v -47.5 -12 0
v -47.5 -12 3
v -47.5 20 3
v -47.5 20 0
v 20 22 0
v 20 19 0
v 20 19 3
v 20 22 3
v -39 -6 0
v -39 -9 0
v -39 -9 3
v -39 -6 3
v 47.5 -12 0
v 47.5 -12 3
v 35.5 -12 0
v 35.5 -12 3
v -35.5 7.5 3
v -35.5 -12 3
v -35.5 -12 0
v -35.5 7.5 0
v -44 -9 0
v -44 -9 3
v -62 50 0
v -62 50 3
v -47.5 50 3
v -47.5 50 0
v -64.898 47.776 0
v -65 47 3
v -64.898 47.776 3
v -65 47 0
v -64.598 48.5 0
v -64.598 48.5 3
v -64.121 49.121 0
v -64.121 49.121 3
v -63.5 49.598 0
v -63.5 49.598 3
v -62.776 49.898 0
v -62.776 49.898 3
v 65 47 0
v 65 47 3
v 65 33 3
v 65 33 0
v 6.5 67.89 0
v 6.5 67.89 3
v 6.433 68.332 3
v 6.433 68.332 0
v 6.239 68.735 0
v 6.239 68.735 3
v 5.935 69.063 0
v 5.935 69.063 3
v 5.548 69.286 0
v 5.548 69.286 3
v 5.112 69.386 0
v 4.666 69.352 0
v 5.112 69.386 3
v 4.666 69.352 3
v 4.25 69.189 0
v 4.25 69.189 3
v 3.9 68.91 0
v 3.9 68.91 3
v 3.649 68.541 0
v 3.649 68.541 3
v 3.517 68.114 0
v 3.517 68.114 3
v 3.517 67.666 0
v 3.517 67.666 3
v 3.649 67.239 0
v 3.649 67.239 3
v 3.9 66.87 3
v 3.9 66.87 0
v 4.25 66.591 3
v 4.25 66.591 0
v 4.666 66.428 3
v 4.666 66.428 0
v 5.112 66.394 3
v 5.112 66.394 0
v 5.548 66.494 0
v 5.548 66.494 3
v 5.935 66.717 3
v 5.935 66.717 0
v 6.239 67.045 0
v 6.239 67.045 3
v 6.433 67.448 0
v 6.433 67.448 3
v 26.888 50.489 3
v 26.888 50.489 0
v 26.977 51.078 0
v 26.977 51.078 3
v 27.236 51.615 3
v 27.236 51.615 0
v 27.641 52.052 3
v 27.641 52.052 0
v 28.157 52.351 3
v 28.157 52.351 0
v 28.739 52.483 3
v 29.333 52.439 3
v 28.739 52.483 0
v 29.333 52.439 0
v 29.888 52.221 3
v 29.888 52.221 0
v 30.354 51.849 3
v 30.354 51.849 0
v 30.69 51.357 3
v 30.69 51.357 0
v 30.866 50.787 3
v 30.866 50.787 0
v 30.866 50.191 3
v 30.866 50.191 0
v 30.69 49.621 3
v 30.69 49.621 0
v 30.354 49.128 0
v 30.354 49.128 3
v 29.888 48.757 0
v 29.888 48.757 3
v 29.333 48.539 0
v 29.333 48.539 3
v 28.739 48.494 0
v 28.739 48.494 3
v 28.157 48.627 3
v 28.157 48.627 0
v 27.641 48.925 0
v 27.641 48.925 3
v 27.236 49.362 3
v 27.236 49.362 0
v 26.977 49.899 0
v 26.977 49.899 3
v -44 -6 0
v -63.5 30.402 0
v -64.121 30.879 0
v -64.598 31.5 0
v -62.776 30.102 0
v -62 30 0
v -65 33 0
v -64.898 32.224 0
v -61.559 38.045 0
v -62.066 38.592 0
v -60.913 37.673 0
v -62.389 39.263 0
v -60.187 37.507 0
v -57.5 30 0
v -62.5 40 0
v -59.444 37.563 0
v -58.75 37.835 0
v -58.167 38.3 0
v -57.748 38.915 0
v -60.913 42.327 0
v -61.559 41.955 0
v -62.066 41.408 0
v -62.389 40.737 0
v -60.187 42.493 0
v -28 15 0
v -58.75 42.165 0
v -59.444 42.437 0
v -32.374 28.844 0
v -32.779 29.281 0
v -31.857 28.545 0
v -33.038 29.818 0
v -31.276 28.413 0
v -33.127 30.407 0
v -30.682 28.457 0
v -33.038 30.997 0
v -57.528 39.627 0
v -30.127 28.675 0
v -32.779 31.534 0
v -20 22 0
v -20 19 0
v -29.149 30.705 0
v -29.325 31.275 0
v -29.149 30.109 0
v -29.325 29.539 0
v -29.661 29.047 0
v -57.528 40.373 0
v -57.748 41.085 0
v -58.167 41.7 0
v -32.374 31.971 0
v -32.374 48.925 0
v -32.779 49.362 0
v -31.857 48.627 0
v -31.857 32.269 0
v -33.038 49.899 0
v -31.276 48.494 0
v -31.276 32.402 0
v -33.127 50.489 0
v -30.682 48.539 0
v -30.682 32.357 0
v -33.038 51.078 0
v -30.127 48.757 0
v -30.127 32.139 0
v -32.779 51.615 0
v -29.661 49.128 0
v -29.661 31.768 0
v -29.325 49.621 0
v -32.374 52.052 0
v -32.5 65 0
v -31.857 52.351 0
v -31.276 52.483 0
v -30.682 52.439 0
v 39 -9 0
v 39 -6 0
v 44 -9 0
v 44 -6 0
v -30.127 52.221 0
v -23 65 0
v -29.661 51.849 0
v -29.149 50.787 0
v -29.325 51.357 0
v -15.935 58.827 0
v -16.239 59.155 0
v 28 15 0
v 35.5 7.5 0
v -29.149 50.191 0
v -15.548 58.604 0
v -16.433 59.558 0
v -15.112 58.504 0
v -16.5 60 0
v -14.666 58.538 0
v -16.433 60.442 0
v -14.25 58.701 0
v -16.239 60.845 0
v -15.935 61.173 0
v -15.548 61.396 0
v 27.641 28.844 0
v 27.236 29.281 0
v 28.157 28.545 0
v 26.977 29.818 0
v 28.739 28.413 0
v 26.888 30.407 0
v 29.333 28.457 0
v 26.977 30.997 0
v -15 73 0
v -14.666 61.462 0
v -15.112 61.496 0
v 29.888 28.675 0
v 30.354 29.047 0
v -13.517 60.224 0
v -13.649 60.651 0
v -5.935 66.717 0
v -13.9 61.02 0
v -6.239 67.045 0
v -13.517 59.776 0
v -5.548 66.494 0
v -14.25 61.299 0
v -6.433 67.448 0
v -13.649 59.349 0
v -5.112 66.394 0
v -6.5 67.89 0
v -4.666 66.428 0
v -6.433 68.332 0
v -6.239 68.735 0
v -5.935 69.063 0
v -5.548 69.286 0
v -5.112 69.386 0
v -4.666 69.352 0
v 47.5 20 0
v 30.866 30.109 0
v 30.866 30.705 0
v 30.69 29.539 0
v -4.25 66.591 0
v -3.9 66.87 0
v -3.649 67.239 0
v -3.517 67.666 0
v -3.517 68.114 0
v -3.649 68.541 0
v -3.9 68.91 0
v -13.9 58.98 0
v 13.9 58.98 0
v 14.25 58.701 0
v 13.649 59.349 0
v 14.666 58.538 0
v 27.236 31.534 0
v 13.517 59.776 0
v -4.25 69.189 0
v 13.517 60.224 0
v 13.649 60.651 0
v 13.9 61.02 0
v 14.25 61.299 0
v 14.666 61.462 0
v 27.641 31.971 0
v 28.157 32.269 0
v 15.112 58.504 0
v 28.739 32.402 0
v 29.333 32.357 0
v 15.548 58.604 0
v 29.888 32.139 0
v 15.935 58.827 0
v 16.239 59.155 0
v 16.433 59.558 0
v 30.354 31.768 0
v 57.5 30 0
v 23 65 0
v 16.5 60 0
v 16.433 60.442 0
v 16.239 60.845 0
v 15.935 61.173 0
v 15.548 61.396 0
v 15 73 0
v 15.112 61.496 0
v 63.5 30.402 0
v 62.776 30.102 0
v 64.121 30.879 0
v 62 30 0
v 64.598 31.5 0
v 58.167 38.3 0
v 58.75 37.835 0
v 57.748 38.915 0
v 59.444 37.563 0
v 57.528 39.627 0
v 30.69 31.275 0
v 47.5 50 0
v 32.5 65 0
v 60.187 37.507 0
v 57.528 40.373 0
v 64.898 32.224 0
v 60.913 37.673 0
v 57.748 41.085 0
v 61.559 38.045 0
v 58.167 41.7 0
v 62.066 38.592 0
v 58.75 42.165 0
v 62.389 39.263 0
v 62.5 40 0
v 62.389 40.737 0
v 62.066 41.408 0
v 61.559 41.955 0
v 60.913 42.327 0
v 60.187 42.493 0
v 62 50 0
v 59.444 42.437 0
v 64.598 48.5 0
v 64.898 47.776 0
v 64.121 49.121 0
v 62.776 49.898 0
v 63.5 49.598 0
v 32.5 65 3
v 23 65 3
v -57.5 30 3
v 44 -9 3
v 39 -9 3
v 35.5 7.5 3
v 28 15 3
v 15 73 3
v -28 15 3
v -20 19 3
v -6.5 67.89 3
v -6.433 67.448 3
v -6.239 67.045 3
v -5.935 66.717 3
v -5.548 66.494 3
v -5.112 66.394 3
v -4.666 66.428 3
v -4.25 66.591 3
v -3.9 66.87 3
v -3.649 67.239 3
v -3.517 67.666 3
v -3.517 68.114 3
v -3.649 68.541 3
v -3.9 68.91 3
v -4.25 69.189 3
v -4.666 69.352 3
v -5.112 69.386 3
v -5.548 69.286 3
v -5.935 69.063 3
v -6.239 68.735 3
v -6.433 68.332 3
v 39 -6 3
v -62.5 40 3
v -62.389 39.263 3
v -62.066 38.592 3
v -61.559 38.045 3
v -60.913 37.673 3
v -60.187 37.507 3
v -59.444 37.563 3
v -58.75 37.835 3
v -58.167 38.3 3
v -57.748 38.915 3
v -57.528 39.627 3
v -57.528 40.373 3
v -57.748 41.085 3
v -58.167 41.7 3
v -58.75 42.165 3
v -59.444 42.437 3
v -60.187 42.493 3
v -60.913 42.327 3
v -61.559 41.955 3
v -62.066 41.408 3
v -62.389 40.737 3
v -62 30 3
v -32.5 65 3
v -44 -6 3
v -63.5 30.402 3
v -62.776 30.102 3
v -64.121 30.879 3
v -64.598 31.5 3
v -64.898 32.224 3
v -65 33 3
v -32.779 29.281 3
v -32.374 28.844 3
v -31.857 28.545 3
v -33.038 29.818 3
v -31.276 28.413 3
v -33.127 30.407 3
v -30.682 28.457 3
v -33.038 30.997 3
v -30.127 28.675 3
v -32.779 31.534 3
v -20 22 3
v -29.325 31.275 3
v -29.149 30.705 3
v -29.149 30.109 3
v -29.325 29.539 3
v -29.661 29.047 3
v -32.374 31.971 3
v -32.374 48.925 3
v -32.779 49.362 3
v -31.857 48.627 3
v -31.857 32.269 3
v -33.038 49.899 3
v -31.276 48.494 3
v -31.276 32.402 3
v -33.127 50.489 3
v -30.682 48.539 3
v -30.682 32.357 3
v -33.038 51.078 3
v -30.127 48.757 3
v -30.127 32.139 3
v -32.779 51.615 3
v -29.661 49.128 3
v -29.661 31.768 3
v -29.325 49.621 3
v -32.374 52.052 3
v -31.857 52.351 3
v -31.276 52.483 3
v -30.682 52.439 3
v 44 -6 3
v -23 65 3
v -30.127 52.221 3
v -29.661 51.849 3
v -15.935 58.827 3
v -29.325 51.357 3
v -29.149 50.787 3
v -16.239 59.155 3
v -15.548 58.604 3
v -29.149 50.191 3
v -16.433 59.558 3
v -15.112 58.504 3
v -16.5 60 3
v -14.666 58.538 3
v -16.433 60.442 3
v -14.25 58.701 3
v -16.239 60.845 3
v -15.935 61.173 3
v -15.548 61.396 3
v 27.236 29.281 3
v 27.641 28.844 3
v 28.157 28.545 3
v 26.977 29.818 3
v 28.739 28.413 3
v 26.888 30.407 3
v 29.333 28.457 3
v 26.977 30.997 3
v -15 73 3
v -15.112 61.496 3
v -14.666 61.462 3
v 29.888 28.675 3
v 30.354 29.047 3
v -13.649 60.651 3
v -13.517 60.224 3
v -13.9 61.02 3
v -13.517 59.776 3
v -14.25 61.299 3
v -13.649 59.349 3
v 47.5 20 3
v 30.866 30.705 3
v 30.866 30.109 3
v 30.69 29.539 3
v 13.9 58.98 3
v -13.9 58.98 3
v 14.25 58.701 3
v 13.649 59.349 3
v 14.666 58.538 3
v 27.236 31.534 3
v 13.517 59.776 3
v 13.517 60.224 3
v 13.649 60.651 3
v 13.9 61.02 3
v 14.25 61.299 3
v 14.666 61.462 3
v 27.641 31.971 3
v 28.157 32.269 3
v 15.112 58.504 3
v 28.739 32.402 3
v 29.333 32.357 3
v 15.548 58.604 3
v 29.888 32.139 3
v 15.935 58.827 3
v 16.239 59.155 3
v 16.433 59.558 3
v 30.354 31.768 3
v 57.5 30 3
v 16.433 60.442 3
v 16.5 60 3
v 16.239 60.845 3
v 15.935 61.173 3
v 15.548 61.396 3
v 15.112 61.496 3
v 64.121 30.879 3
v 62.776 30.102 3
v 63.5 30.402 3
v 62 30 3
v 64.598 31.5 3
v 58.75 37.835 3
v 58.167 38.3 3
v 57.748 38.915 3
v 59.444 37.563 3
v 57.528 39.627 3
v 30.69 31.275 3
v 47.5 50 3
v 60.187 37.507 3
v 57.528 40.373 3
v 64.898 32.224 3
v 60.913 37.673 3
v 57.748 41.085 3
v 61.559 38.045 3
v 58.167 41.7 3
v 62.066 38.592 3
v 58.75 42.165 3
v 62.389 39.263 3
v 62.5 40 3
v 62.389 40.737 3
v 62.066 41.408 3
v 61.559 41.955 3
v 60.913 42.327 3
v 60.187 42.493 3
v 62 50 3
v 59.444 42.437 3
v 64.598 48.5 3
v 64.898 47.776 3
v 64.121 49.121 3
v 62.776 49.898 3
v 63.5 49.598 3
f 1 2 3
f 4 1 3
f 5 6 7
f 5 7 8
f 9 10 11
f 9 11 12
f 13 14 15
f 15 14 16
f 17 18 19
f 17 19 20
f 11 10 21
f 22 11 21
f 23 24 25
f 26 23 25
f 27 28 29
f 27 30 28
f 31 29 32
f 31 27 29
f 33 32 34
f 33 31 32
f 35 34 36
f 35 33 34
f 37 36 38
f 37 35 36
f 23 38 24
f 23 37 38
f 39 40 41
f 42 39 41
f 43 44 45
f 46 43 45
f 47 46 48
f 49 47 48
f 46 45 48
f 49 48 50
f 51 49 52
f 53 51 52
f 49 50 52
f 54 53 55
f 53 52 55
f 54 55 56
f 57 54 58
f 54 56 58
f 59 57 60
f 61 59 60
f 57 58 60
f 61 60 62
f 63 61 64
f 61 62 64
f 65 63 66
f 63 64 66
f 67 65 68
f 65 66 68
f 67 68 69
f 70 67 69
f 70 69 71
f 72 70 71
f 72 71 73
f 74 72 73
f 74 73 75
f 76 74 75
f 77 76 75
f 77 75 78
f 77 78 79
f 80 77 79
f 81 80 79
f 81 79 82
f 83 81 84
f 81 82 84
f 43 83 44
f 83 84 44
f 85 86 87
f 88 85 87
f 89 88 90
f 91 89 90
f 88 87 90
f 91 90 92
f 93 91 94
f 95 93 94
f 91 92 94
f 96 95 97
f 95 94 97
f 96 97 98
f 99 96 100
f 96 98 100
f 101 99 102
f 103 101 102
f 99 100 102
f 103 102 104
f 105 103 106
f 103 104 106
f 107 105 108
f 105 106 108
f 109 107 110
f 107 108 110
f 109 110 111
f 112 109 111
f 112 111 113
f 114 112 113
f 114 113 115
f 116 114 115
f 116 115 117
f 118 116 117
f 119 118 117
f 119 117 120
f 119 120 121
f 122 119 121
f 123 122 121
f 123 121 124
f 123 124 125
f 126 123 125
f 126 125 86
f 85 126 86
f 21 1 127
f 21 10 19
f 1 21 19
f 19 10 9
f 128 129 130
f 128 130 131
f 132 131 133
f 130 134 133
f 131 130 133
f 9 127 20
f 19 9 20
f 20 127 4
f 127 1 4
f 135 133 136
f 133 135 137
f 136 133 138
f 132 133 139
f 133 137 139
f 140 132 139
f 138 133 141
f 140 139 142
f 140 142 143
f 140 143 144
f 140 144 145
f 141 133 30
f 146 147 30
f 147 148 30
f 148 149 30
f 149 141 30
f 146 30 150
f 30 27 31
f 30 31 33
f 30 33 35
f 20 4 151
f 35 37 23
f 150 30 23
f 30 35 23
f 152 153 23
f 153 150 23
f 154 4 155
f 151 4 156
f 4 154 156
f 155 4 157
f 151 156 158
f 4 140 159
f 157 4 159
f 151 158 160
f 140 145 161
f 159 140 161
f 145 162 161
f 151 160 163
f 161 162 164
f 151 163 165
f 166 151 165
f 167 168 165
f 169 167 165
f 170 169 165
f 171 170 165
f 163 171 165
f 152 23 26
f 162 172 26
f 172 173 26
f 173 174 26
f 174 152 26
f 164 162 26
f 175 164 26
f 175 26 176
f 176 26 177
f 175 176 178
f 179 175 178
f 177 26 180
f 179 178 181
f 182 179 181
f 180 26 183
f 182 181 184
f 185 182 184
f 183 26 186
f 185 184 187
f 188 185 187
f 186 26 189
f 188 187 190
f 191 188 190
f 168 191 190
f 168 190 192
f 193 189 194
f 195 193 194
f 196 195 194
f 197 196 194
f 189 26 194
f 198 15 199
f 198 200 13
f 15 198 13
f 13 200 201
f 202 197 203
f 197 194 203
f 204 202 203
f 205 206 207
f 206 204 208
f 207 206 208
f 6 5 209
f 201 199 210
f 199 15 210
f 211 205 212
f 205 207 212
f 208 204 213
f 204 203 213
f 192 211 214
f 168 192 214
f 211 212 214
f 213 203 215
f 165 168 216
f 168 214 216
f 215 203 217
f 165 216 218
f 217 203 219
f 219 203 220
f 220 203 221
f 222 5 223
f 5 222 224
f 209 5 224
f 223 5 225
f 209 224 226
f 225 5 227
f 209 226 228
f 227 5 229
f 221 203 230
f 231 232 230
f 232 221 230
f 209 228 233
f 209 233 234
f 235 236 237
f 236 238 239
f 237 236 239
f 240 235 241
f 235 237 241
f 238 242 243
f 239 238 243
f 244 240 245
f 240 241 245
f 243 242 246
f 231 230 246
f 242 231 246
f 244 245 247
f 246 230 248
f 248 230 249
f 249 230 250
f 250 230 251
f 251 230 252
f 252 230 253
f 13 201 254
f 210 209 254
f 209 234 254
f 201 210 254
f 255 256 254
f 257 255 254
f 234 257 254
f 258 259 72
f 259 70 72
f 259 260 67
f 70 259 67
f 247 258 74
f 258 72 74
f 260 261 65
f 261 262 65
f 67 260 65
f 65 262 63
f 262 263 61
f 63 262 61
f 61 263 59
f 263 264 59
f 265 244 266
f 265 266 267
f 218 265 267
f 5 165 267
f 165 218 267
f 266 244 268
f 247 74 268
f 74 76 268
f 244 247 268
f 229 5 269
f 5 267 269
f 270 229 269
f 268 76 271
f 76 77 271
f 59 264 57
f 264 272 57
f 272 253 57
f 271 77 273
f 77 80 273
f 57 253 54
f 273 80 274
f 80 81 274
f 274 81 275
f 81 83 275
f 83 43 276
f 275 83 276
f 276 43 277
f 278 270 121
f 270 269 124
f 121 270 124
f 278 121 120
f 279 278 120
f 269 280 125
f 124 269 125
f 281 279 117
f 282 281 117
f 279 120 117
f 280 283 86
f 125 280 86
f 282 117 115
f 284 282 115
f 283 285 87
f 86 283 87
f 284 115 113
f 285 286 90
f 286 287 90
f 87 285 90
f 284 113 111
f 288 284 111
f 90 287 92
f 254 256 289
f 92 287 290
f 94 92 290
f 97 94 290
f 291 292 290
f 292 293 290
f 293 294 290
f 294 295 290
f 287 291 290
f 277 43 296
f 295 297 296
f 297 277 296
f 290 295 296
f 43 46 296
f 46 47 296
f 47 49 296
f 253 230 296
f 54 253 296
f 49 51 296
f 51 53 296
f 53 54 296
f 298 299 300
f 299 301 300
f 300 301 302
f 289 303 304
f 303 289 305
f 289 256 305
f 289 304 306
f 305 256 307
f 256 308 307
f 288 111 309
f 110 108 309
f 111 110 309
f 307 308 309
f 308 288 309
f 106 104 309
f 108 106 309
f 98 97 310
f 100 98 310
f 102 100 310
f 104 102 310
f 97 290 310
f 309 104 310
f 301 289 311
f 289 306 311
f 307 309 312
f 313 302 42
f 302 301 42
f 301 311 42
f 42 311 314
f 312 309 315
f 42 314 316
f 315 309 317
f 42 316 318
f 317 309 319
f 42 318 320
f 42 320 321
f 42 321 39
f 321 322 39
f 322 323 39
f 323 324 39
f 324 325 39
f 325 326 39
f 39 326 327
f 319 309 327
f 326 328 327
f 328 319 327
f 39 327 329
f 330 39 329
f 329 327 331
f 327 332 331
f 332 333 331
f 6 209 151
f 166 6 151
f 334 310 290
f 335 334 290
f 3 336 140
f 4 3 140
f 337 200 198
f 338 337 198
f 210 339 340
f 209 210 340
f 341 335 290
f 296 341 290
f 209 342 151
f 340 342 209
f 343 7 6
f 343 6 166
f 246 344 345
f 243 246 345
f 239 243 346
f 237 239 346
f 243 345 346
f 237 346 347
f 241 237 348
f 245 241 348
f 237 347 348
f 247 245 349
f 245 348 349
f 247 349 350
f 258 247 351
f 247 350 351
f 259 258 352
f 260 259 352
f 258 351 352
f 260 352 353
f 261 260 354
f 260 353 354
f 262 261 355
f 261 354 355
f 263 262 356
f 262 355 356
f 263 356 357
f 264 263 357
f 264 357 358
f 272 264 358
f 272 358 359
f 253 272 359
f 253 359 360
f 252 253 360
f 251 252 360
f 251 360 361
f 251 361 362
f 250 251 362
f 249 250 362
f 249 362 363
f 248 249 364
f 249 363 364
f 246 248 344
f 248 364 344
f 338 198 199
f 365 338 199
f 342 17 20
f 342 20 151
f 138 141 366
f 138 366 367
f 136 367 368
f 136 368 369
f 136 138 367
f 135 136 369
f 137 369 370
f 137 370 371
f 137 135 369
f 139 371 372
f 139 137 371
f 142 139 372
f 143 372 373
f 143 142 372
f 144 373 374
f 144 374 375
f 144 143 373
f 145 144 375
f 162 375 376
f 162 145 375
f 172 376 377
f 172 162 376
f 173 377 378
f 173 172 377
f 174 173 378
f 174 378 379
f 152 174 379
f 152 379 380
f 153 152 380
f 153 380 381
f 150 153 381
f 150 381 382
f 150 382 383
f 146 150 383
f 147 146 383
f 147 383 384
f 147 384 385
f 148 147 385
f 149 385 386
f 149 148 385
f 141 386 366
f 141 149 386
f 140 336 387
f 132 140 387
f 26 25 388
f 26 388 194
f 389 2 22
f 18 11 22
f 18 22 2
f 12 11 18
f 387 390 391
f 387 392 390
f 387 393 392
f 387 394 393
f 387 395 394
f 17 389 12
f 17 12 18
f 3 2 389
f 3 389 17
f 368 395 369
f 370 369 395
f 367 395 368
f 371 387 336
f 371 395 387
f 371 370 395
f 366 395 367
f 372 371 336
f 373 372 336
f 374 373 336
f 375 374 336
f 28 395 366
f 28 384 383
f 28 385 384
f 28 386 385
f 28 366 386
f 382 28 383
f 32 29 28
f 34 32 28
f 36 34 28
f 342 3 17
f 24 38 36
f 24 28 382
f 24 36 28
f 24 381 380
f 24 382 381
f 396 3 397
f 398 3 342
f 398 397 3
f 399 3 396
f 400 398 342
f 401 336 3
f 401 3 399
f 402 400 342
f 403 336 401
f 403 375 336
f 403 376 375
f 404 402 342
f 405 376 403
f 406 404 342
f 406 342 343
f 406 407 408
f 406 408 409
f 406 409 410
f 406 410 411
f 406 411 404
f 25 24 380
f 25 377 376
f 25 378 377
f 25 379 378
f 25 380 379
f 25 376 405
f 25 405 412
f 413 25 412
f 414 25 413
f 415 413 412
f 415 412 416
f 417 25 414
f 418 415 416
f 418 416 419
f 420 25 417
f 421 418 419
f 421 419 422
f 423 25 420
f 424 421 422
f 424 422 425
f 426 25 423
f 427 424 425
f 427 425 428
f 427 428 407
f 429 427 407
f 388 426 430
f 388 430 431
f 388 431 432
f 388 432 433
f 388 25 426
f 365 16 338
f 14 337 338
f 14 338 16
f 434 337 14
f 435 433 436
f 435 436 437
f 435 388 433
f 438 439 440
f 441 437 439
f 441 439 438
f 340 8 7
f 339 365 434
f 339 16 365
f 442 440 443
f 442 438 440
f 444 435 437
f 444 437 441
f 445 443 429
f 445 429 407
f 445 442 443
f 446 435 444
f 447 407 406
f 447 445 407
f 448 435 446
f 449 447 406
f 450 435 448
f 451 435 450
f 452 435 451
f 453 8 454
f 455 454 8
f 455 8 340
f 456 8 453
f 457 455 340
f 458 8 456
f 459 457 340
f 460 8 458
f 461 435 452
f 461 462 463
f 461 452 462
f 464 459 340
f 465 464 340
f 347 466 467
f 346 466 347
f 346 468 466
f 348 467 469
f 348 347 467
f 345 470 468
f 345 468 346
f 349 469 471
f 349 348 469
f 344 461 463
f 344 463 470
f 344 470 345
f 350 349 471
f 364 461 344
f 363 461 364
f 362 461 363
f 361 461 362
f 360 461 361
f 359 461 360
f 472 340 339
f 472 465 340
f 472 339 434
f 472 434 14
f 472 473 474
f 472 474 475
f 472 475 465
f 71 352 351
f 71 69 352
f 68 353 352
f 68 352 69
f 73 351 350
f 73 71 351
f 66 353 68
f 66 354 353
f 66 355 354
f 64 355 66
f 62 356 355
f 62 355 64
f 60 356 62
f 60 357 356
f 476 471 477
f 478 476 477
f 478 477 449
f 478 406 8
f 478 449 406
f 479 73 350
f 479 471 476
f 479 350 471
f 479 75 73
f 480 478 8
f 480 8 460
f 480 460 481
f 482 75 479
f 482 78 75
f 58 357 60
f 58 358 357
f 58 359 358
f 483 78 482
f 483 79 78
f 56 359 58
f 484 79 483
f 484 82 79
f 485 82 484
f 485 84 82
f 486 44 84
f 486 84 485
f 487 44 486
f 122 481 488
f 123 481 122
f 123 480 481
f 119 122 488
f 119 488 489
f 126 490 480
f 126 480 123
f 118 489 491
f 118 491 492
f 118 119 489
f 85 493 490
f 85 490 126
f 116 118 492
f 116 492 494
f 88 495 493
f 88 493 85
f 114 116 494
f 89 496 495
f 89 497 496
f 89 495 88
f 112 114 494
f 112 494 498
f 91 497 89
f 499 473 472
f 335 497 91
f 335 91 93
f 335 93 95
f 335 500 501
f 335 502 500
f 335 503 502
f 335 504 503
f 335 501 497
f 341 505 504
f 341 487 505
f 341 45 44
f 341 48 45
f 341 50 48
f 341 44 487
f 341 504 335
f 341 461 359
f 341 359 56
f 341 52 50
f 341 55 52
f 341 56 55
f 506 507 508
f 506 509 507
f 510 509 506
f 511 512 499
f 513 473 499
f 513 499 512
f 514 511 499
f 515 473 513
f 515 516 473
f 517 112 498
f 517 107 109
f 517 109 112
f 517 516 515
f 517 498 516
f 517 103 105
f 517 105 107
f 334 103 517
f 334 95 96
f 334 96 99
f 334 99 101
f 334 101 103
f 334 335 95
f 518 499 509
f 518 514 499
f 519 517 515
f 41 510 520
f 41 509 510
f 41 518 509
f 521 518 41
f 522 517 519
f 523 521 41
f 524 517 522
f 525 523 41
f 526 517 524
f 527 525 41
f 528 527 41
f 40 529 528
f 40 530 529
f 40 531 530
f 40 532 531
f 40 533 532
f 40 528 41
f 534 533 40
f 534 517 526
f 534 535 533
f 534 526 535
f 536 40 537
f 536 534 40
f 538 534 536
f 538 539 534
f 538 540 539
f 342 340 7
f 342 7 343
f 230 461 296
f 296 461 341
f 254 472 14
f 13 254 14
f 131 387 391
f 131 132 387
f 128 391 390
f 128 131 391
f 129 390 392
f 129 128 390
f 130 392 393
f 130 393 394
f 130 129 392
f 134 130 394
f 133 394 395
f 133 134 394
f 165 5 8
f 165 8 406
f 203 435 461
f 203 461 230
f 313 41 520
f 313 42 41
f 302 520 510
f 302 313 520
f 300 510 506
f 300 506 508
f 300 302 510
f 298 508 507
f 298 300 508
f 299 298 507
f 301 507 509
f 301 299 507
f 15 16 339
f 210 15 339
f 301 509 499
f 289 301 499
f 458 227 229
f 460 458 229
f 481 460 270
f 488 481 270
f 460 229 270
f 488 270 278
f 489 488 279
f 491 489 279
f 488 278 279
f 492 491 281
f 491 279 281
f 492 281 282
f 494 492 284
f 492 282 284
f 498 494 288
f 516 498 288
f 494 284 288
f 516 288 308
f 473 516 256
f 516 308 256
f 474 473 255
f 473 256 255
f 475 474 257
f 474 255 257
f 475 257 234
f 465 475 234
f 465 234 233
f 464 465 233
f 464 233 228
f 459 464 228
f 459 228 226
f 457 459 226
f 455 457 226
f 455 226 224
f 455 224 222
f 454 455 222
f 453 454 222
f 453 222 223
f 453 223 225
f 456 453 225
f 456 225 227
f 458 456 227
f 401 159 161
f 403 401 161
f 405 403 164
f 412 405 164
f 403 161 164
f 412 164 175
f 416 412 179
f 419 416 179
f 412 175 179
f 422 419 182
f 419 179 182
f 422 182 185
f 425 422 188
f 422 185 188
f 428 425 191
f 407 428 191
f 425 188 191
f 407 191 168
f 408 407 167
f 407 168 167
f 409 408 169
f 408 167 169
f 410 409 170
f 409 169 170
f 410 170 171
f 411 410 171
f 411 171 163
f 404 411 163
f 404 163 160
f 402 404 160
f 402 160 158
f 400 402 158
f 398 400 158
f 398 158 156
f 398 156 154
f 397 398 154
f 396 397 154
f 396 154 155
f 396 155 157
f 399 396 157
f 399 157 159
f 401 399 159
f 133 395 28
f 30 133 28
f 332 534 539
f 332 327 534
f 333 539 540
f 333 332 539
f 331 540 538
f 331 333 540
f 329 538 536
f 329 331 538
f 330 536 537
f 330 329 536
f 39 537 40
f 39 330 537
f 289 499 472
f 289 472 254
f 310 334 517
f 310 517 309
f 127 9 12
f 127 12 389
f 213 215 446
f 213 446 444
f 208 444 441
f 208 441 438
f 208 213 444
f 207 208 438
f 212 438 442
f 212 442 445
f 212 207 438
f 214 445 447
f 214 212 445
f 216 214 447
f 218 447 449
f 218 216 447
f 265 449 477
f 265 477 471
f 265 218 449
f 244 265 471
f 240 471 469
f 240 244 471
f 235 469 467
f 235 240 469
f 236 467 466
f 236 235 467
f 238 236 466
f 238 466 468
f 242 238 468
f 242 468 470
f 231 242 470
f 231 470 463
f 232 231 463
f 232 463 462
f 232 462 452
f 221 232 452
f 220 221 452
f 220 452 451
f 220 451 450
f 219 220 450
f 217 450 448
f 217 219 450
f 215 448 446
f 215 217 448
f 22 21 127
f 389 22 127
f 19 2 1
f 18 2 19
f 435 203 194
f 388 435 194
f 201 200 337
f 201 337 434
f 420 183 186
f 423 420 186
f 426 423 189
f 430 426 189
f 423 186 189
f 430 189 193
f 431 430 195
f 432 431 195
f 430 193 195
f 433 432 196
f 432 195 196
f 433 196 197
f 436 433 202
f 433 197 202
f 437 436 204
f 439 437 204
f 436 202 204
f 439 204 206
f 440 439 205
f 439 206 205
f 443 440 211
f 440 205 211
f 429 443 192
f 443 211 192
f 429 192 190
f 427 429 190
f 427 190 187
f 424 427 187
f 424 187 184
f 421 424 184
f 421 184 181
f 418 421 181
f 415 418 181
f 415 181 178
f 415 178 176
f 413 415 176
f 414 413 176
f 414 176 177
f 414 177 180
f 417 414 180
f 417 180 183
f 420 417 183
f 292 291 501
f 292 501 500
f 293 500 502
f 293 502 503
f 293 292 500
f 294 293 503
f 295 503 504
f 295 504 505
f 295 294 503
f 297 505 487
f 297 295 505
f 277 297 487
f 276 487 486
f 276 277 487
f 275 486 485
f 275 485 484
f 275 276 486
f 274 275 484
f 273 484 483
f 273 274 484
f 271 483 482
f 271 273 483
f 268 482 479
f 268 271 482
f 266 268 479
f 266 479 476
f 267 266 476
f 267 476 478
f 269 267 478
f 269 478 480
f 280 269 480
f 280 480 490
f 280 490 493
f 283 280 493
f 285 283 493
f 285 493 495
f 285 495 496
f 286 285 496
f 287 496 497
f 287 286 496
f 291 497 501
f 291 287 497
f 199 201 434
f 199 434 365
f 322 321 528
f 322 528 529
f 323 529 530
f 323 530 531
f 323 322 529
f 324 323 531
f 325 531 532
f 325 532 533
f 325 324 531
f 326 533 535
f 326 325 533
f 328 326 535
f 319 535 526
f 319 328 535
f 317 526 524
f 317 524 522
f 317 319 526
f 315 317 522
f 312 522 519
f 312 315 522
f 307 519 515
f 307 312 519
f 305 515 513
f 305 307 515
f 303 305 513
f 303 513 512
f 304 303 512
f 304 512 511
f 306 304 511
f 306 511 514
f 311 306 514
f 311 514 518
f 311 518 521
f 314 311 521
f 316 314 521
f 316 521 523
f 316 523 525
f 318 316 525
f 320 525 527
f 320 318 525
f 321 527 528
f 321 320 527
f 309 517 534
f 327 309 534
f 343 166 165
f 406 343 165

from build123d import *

# Parameters (mm, degrees)
SKETCH1_R           = 1.5
SKETCH1_R_2         = 2.5
BOSS_EXTRUDE1_DEPTH = 3
CUT_EXTRUDE1_DEPTH  = 3
FILLET1_R           = 3
CHAMFER4_SIZE       = 15
CHAMFER5_SIZE       = 10
SKETCH13_W          = 30
SKETCH13_H          = 8
BOSS_EXTRUDE5_DEPTH = 3
SKETCH8_W           = 95
SKETCH8_H           = 65.304735008
CUT_EXTRUDE5_DEPTH  = 10
SKETCH11_W          = 95
SKETCH11_H          = 7
BOSS_EXTRUDE3_DEPTH = 3
SKETCH10_R          = 1.5
CUT_EXTRUDE6_DEPTH  = 3
BOSS_EXTRUDE4_DEPTH = 3
CHAMFER6_SIZE       = 8
SKETCH17_R          = 2
CUT_EXTRUDE9_DEPTH  = 10
SKETCH15_W          = 40
SKETCH15_H          = 3
CUT_EXTRUDE8_DEPTH  = 10
BOSS_EXTRUDE6_START = -3
BOSS_EXTRUDE6_DEPTH = 3
SKETCH18_W          = 5
SKETCH18_H          = 3
CUT_EXTRUDE11_DEPTH = 10


with BuildPart() as part:
    # Sketch1 → Boss-Extrude1 (new body)
    with BuildSketch(Plane.XY):
        with BuildLine():
            Line((40.5, -40), (44.5, -40))
            Line((44.5, -40), (47.5, -37))
            Line((47.5, -37), (47.5, 10))
            Line((47.5, 10), (47.5, 15))
            Line((47.5, 15), (52.5, 15))
            Line((52.5, 15), (70, 15))
            ThreePointArc((70, 15), (73.535533906, 16.464466094), (75, 20))
            Line((75, 20), (75, 60))
            ThreePointArc((75, 60), (73.535533906, 63.535533906), (70, 65))
            Line((70, 65), (-70, 65))
            ThreePointArc((-70, 65), (-73.535533906, 63.535533906), (-75, 60))
            Line((-75, 60), (-75, 20))
            ThreePointArc((-75, 20), (-73.535533906, 16.464466094), (-70, 15))
            Line((-70, 15), (-52.5, 15))
            Line((-52.5, 15), (-47.5, 15))
            Line((-47.5, 15), (-47.5, 10))
            Line((-47.5, 10), (-47.5, -37))
            Line((-47.5, -37), (-44.5, -40))
            Line((-44.5, -40), (-40.5, -40))
            Line((-40.5, -40), (-37.5, -37))
            Line((-37.5, -37), (-37.5, 10))
            ThreePointArc((-37.5, 10), (-36.035533906, 13.535533906), (-32.5, 15))
            Line((-32.5, 15), (32.5, 15))
            ThreePointArc((32.5, 15), (36.035533906, 13.535533906), (37.5, 10))
            Line((37.5, 10), (37.5, -37))
            Line((37.5, -37), (40.5, -40))
        make_face()
        with Locations((-42.5, -20)):
            Circle(SKETCH1_R, mode=Mode.SUBTRACT)
        with Locations((-42.5, -35)):
            Circle(SKETCH1_R, mode=Mode.SUBTRACT)
        with Locations((42.5, -20)):
            Circle(SKETCH1_R, mode=Mode.SUBTRACT)
        with Locations((42.5, -35)):
            Circle(SKETCH1_R, mode=Mode.SUBTRACT)
        with Locations((60, 40)):
            Circle(SKETCH1_R_2, mode=Mode.SUBTRACT)
        with Locations((15, 60)):
            Circle(SKETCH1_R, mode=Mode.SUBTRACT)
        with Locations(Location((-15, 60, 0), (0, 0, 180))):
            Circle(SKETCH1_R, mode=Mode.SUBTRACT)
        with Locations(Location((-60, 40, 0), (0, 0, 180))):
            Circle(SKETCH1_R_2, mode=Mode.SUBTRACT)
    extrude(amount=BOSS_EXTRUDE1_DEPTH)

    # Sketch3 → Cut-Extrude1 (cut)
    with BuildSketch(Plane.XY.offset(3)):
        Polygon((65, 50), (65, 30), (47.5, 30), (47.5, 15), (75, 15), (75, 23.034767996), (75, 32.364095159), (75, 65), (47.5, 65), (47.5, 50), align=None)
        Polygon((-47.5, 65), (-75, 65), (-75, 32.364095159), (-75, 23.034767996), (-75, 15), (-47.5, 15), (-47.5, 30), (-65, 30), (-65, 50), (-47.5, 50), align=None)
    extrude(amount=-CUT_EXTRUDE1_DEPTH, mode=Mode.SUBTRACT)

    # Fillet1
    fillet1_edges = [part.edges().sort_by_distance(p)[0] for p in [
        (65, 50, 1.5),
        (65, 30, 1.5),
        (-65, 50, 1.5),
        (-65, 30, 1.5),
    ]]
    fillet(fillet1_edges, radius=FILLET1_R)

    # Chamfer4
    chamfer4_edges = [part.edges().sort_by_distance(p)[0] for p in [
        (47.5, 65, 1.5),
        (-47.5, 65, 1.5),
    ]]
    chamfer(chamfer4_edges, length=CHAMFER4_SIZE - 0.0001)  # a hair under: the kernel refuses the full size

    # Chamfer5
    chamfer5_edges = [part.edges().sort_by_distance(p)[0] for p in [
        (47.5, 30, 1.5),
        (-47.5, 30, 1.5),
    ]]
    chamfer(chamfer5_edges, length=CHAMFER5_SIZE)

    # Sketch13 → Boss-Extrude5 (add)
    with BuildSketch(Plane.XY.offset(3)):
        with Locations((0, 69)):
            Rectangle(SKETCH13_W, SKETCH13_H)
    extrude(amount=-BOSS_EXTRUDE5_DEPTH)

    # Sketch8 → Cut-Extrude5 (cut)
    with BuildSketch(Plane.XY.offset(3)):
        with Locations((0, -12.652367504)):
            Rectangle(SKETCH8_W, SKETCH8_H)
    extrude(amount=-CUT_EXTRUDE5_DEPTH, mode=Mode.SUBTRACT)

    # Sketch11 → Boss-Extrude3 (add)
    with BuildSketch(Plane.XY.offset(3)):
        with Locations((0, 16.5)):
            Rectangle(SKETCH11_W, SKETCH11_H)
    extrude(amount=-BOSS_EXTRUDE3_DEPTH)

    # Sketch10 → Cut-Extrude6 (cut)
    with BuildSketch(Plane.XY.offset(3)):
        with Locations((5, 67.89)):
            Circle(SKETCH10_R)
        with Locations(Location((-5, 67.89, 0), (0, 0, 180))):
            Circle(SKETCH10_R)
        with Locations((-5, 18.11)):
            Circle(SKETCH10_R)
        with Locations(Location((5, 18.11, 0), (0, 0, 180))):
            Circle(SKETCH10_R)
        Polygon((-30, 13), (-28, 15), (28, 15), (30, 13), align=None)
    extrude(amount=-CUT_EXTRUDE6_DEPTH, mode=Mode.SUBTRACT)

    # Sketch12 → Boss-Extrude4 (add)
    with BuildSketch(Plane.XY.offset(3)):
        Polygon((47.5, 13), (47.5, -12), (35.5, -12), (35.5, 7.5), (30, 13), (35.5, 13), align=None)
        Polygon((-35.5, 13), (-47.5, 13), (-47.5, -12), (-35.5, -12), (-35.5, 7.5), (-30, 13), align=None)
    extrude(amount=-BOSS_EXTRUDE4_DEPTH)

    # Chamfer6
    chamfer6_edges = [part.edges().sort_by_distance(p)[0] for p in [
        (15, 65, 1.5),
        (-15, 65, 1.5),
    ]]
    chamfer(chamfer6_edges, length=CHAMFER6_SIZE - 0.0001)  # a hair under: the kernel refuses the full size

    # Sketch17 → Cut-Extrude9 (cut)
    with BuildSketch(Plane(origin=(0, 0, 0), x_dir=(-1, 0, 0), z_dir=(0, 0, -1))):
        with Locations((-28.88804467, 50.488766948)):
            Circle(SKETCH17_R)
        with Locations((-28.88804467, 30.407216077)):
            Circle(SKETCH17_R)
        with Locations((31.126767325, 30.407216077)):
            Circle(SKETCH17_R)
        with Locations((31.126767325, 50.488766948)):
            Circle(SKETCH17_R)
    extrude(amount=-CUT_EXTRUDE9_DEPTH, mode=Mode.SUBTRACT)

    # Sketch15 → Cut-Extrude8 (cut)
    with BuildSketch(Plane(origin=(0, 0, 0), x_dir=(-1, 0, 0), z_dir=(0, 0, -1))):
        with Locations((0, 20.5)):
            Rectangle(SKETCH15_W, SKETCH15_H)
    extrude(amount=-CUT_EXTRUDE8_DEPTH, mode=Mode.SUBTRACT)

    # Sketch16 → Boss-Extrude6 (add)
    with BuildSketch(Plane(origin=(0, 0, 0), x_dir=(-1, 0, 0), z_dir=(0, 0, -1)).offset(BOSS_EXTRUDE6_START)):
        with BuildLine():
            Line((3.792564702, 19), (6.207435298, 19))
            ThreePointArc((6.207435298, 19), (5, 16.61), (3.792564702, 19))
        make_face()
        with BuildLine():
            Line((-6.207435298, 19), (-3.792564702, 19))
            ThreePointArc((-3.792564702, 19), (-5, 16.61), (-6.207435298, 19))
        make_face()
    extrude(amount=BOSS_EXTRUDE6_DEPTH)

    # Sketch18 → Cut-Extrude11 (cut)
    with BuildSketch(Plane(origin=(0, 0, 0), x_dir=(-1, 0, 0), z_dir=(0, 0, -1))):
        with Locations((-131.776111861, 19.947341704)):
            Rectangle(SKETCH18_W, SKETCH18_H)
        with Locations((-41.5, -7.5)):
            Rectangle(SKETCH18_W, SKETCH18_H)
        with Locations((41.5, -7.5)):
            Rectangle(SKETCH18_W, SKETCH18_H)
    extrude(amount=-CUT_EXTRUDE11_DEPTH, mode=Mode.SUBTRACT)


solid = part.part
